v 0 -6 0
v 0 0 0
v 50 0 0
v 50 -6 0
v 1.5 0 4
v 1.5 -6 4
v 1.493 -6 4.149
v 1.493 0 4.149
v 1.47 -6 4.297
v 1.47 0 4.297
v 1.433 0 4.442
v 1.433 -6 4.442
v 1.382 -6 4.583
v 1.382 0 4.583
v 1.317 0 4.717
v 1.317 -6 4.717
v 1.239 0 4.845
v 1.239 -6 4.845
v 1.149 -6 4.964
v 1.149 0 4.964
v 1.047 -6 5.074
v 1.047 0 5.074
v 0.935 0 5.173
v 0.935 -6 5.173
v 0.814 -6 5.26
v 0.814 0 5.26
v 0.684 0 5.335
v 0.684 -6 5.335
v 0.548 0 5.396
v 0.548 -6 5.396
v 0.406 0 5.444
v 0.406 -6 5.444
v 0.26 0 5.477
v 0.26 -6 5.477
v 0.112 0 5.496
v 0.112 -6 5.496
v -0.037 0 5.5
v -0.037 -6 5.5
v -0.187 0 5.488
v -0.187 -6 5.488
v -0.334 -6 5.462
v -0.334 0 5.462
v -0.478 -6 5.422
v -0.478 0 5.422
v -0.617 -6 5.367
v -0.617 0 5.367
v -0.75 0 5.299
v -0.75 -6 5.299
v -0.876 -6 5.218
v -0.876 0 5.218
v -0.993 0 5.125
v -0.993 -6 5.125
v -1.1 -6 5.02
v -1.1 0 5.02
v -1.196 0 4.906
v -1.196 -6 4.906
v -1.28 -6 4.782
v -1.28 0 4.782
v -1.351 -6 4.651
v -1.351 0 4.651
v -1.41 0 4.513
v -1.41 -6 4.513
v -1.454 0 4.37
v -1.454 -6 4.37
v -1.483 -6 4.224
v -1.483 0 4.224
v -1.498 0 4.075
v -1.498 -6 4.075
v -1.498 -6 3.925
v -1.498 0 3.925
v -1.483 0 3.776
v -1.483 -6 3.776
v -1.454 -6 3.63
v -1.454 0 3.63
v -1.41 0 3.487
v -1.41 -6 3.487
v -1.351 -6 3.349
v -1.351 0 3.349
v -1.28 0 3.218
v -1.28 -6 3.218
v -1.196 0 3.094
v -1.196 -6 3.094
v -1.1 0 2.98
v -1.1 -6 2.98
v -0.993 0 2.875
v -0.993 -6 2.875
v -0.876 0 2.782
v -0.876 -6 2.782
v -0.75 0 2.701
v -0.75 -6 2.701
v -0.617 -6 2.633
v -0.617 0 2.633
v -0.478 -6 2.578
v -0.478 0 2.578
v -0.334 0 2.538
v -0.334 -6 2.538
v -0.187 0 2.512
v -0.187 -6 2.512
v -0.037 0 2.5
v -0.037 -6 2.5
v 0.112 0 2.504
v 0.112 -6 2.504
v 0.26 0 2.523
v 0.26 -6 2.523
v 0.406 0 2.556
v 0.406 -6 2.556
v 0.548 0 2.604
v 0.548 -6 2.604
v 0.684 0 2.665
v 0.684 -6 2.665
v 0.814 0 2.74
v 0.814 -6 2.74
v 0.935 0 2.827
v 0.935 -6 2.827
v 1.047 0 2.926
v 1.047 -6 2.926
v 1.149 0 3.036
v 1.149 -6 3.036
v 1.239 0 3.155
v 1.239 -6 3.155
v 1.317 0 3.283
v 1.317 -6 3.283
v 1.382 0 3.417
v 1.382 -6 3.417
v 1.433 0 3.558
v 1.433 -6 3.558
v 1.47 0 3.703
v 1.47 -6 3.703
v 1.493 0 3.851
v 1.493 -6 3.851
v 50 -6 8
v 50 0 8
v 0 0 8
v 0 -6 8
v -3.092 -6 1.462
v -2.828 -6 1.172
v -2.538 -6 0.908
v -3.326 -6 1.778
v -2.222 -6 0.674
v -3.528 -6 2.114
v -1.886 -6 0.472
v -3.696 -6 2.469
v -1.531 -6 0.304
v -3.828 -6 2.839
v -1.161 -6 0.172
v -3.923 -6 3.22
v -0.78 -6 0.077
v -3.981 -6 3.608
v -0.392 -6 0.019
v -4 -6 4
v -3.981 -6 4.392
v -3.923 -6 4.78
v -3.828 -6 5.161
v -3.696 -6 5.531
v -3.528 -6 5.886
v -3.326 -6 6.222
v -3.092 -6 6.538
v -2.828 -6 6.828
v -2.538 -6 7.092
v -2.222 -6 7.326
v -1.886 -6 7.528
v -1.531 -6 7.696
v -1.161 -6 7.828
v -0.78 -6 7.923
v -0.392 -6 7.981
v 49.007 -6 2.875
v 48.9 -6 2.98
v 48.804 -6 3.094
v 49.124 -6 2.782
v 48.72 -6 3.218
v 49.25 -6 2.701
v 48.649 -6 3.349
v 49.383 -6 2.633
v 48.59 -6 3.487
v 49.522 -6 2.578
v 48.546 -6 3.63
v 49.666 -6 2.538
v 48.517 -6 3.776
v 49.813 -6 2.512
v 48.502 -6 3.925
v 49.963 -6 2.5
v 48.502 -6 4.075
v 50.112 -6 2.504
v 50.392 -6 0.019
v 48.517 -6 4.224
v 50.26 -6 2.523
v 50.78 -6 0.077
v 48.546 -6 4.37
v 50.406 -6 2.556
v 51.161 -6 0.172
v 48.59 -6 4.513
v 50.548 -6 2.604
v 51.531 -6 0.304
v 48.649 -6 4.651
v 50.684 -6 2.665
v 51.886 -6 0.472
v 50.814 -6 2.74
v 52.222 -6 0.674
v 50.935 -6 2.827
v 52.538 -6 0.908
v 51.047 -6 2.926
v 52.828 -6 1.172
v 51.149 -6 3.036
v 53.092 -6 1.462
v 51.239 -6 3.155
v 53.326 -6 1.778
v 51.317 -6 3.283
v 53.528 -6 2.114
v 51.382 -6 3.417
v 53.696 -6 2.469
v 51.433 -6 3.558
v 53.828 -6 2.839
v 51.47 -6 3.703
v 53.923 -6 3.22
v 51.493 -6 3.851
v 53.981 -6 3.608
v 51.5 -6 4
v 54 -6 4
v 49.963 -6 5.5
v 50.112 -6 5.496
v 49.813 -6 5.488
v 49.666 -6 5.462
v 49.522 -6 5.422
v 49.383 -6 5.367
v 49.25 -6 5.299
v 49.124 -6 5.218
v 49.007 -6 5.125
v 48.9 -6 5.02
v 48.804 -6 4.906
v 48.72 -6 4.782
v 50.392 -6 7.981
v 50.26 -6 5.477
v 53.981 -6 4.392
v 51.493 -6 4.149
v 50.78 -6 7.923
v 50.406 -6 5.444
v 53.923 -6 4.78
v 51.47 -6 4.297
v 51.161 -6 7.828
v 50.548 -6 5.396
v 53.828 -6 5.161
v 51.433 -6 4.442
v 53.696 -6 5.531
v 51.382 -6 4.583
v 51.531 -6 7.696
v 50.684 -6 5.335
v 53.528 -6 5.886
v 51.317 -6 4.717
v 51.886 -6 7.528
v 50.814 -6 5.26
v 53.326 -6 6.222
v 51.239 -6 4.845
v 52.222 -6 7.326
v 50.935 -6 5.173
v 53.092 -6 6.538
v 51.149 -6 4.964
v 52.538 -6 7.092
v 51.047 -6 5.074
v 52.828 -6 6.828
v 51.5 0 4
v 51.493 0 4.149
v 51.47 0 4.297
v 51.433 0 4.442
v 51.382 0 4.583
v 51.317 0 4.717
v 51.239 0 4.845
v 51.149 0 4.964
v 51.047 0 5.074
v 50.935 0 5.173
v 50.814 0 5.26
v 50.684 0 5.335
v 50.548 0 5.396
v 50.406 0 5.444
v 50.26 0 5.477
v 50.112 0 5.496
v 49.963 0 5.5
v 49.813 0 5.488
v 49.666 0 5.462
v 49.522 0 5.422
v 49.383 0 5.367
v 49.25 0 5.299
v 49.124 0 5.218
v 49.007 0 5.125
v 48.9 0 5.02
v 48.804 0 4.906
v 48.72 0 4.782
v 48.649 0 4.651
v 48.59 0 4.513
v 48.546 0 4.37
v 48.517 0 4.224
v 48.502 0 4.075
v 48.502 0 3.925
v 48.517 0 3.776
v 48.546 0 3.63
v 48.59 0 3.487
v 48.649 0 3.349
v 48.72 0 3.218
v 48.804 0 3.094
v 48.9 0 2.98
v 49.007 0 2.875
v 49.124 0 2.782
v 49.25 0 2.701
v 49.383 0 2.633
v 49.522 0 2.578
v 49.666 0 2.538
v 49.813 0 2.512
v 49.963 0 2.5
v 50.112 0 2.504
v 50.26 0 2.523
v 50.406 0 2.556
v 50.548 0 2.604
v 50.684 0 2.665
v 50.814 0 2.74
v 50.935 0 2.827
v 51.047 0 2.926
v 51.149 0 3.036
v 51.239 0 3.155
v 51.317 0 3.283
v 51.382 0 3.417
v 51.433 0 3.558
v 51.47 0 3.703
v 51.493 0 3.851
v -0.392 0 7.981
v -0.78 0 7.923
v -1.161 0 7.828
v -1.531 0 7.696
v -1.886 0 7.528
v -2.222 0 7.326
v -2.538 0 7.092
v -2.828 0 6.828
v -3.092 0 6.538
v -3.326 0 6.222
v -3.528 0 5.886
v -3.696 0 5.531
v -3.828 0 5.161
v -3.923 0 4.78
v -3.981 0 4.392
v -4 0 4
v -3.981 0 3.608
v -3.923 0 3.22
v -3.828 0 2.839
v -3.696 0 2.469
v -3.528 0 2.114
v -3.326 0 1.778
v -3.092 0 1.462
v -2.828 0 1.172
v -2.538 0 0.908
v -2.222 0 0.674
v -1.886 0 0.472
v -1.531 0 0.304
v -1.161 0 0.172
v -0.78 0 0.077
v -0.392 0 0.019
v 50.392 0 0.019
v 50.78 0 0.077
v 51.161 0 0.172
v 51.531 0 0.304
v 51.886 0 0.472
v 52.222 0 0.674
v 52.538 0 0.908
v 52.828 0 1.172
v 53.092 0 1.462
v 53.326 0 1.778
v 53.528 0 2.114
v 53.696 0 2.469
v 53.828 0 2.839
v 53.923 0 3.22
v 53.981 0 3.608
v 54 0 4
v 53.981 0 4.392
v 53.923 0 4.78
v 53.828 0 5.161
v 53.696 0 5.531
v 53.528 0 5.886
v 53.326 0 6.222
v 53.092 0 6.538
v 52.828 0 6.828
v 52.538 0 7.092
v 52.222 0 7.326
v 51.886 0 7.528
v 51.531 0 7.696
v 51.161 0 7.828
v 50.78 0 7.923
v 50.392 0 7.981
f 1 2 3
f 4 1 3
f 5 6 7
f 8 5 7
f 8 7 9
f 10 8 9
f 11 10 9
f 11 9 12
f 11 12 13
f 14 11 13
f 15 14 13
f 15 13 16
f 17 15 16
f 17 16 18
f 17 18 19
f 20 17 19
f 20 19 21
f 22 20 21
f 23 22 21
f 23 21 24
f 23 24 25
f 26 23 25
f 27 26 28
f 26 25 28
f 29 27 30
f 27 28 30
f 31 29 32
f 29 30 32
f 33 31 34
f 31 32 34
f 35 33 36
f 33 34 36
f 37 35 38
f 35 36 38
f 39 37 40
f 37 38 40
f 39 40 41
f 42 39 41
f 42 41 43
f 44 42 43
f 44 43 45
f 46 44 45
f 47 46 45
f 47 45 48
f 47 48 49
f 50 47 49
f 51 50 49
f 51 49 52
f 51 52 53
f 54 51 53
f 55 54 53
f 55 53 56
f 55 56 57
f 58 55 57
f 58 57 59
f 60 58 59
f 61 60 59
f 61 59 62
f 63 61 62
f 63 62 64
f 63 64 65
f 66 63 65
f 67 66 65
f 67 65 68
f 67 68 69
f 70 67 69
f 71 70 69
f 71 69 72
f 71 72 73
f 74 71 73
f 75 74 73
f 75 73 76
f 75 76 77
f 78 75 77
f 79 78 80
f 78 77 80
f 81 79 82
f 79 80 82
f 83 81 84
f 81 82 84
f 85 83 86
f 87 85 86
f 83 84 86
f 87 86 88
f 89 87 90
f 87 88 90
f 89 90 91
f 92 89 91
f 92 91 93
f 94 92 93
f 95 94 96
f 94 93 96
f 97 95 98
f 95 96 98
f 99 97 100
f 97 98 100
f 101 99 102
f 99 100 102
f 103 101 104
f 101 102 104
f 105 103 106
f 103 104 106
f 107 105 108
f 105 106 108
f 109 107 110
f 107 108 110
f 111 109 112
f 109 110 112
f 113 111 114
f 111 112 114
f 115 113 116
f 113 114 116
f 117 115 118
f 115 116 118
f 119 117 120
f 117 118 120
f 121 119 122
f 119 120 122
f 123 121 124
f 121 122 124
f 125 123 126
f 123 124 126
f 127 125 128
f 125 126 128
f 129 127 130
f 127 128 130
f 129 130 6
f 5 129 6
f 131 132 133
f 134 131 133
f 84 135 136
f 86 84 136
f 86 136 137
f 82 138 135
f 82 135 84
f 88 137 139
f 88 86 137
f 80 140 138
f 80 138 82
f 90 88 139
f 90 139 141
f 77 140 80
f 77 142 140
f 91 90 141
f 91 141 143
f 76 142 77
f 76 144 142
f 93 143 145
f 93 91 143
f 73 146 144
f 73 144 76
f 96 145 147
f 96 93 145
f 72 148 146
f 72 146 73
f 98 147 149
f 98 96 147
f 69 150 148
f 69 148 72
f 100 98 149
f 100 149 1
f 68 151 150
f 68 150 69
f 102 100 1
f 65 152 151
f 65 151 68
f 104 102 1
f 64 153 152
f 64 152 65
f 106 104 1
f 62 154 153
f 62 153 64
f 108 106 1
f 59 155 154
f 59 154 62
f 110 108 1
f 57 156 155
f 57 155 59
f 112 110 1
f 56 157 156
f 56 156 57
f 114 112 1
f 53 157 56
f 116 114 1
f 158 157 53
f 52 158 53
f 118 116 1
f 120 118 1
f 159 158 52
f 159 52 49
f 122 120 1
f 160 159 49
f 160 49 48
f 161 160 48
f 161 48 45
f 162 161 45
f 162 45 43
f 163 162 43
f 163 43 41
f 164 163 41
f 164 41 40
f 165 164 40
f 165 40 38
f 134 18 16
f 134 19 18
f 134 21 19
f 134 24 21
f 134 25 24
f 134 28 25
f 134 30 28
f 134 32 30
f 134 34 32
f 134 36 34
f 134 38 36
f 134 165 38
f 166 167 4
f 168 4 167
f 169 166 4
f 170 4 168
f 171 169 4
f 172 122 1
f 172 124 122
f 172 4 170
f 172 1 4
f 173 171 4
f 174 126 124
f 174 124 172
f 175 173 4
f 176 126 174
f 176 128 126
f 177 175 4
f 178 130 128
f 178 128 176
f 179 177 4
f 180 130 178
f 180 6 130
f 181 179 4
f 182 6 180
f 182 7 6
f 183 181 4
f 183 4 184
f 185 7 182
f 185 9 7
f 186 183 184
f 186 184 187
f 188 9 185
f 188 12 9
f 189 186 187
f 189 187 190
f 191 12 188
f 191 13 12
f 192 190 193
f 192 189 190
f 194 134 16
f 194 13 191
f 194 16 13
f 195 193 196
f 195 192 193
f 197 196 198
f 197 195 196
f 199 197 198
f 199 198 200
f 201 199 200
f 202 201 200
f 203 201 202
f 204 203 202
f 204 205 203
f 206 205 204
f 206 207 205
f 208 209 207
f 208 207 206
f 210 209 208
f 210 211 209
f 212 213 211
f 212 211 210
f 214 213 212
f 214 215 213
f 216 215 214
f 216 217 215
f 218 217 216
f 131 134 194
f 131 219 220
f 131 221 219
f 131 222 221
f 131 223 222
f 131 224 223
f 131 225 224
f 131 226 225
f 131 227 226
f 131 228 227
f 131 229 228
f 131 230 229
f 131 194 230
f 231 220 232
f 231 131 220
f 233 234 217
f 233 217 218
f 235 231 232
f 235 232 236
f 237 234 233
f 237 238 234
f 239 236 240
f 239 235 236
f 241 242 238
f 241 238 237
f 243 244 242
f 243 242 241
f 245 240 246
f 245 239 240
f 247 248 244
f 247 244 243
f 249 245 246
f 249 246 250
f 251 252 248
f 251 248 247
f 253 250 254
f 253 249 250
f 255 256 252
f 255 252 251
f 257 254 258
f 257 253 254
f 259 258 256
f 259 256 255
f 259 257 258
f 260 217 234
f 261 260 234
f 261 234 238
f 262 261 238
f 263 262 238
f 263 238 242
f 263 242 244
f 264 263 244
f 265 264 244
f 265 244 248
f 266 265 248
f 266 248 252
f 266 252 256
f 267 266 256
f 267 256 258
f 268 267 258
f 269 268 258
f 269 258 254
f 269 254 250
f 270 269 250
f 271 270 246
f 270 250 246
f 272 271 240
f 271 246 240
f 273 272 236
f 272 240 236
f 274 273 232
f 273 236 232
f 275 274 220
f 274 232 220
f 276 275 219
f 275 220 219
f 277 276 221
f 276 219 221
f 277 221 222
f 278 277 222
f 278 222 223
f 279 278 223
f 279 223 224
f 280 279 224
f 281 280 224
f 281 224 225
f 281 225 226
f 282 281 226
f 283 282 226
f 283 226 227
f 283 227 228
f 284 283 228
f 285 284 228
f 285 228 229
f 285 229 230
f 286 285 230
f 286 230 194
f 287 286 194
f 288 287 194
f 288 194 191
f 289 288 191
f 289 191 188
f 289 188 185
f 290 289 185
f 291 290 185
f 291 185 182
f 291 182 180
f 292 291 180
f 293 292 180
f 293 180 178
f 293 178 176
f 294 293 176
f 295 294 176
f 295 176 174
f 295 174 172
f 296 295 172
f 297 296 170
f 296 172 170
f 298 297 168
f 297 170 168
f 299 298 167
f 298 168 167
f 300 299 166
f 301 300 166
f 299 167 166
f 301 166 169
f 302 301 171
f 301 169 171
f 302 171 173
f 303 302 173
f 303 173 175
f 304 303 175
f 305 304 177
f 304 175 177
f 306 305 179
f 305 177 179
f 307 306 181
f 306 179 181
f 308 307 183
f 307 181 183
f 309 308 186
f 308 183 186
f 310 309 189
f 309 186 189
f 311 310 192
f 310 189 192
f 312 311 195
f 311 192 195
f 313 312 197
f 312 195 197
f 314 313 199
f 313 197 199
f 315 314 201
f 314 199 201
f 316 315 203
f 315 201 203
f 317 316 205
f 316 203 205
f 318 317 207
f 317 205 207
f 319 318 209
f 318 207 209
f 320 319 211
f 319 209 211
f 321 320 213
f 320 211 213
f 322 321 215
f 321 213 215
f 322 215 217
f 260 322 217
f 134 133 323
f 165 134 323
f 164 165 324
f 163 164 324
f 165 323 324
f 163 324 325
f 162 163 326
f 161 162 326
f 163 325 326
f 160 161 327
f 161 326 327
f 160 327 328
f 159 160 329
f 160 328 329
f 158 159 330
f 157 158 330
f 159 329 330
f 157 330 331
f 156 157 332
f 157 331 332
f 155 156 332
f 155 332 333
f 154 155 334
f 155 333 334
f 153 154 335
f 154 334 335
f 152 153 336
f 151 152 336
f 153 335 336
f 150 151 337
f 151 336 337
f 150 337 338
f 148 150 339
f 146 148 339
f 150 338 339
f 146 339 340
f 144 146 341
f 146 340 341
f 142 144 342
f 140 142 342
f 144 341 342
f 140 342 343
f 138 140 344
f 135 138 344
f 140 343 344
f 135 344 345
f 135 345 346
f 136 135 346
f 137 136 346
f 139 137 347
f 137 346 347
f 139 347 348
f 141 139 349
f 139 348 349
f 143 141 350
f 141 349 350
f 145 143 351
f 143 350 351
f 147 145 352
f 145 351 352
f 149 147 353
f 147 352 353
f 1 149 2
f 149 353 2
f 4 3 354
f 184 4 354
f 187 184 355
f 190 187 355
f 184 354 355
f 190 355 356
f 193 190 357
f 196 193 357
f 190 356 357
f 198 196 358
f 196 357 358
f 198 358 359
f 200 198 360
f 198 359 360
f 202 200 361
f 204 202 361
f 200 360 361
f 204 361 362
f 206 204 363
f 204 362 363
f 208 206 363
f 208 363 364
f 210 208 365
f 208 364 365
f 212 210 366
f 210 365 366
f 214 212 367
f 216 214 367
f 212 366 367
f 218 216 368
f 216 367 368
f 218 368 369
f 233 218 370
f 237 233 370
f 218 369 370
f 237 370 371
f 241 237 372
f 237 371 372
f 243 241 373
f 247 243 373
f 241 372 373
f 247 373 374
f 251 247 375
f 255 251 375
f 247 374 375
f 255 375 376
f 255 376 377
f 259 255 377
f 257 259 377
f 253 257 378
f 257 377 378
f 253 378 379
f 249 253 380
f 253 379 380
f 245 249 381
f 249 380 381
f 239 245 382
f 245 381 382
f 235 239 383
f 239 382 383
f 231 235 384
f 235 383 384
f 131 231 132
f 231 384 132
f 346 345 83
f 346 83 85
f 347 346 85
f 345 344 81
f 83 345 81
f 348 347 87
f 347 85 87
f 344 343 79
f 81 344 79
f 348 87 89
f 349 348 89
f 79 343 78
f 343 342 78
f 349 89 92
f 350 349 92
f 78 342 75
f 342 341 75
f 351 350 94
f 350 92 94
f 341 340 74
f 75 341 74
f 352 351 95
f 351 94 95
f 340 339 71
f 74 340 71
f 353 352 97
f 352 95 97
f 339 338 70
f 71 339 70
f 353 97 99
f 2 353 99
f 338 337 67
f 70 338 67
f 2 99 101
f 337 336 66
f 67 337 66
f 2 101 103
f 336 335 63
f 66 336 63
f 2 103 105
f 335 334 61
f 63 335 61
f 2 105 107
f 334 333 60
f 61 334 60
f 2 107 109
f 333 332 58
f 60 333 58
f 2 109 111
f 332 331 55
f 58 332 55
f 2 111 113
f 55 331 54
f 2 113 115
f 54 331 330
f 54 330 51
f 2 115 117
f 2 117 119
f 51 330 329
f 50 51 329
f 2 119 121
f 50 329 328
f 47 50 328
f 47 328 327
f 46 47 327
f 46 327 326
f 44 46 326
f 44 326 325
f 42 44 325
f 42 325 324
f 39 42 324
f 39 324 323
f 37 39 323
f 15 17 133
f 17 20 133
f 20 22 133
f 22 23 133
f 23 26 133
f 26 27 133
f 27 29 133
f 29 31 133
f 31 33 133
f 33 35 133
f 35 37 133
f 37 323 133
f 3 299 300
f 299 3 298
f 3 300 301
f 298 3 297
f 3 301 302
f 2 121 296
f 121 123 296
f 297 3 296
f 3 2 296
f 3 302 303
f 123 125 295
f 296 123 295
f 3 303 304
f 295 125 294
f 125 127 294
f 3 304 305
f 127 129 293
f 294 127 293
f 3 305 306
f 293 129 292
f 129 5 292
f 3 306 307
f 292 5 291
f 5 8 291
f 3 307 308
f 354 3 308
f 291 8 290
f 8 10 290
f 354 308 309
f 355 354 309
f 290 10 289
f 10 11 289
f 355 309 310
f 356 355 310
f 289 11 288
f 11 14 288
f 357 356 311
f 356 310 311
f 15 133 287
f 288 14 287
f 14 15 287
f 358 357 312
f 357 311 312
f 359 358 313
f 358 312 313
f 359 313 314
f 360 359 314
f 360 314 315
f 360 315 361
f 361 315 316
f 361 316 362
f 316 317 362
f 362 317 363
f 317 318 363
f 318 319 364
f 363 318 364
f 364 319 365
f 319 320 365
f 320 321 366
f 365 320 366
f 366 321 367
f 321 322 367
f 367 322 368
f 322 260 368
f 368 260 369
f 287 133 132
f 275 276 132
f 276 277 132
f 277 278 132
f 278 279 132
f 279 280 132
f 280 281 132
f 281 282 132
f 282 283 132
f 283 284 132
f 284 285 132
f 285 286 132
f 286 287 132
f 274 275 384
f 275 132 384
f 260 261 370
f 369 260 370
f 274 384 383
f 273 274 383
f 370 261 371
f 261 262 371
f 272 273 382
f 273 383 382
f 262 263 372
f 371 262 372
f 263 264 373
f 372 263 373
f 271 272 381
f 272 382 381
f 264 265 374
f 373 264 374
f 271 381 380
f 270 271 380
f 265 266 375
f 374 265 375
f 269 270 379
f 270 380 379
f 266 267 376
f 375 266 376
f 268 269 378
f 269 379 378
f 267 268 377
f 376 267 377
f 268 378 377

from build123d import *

# Parameters (mm, degrees)
F1_DEPTH = 6
F2_R     = 1.5
F3_DEPTH = 6.001
F4_R     = 1.5
F5_DEPTH = 6.001


with BuildPart() as f1:
    # F0 (on Front) → F1 (new body)
    with BuildSketch(Plane.XZ):
        with BuildLine():
            ThreePointArc((0, 8), (-4, 4), (0, 0))
            Line((0, 0), (50, 0))
            ThreePointArc((50, 0), (54, 4), (50, 8))
            Line((50, 8), (0, 8))
        make_face()
    extrude(amount=F1_DEPTH)

    # F2 (on face) → F3 (cut, through all)
    with BuildSketch(Plane.XZ.offset(6)):
        with Locations((0, 4)):
            Circle(F2_R)
    extrude(amount=-F3_DEPTH, mode=Mode.SUBTRACT)

    # F4 (on face) → F5 (cut, through all)
    with BuildSketch(Plane.XZ.offset(6)):
        with Locations((50, 4)):
            Circle(F4_R)
    extrude(amount=-F5_DEPTH, mode=Mode.SUBTRACT)


solid = f1.part
